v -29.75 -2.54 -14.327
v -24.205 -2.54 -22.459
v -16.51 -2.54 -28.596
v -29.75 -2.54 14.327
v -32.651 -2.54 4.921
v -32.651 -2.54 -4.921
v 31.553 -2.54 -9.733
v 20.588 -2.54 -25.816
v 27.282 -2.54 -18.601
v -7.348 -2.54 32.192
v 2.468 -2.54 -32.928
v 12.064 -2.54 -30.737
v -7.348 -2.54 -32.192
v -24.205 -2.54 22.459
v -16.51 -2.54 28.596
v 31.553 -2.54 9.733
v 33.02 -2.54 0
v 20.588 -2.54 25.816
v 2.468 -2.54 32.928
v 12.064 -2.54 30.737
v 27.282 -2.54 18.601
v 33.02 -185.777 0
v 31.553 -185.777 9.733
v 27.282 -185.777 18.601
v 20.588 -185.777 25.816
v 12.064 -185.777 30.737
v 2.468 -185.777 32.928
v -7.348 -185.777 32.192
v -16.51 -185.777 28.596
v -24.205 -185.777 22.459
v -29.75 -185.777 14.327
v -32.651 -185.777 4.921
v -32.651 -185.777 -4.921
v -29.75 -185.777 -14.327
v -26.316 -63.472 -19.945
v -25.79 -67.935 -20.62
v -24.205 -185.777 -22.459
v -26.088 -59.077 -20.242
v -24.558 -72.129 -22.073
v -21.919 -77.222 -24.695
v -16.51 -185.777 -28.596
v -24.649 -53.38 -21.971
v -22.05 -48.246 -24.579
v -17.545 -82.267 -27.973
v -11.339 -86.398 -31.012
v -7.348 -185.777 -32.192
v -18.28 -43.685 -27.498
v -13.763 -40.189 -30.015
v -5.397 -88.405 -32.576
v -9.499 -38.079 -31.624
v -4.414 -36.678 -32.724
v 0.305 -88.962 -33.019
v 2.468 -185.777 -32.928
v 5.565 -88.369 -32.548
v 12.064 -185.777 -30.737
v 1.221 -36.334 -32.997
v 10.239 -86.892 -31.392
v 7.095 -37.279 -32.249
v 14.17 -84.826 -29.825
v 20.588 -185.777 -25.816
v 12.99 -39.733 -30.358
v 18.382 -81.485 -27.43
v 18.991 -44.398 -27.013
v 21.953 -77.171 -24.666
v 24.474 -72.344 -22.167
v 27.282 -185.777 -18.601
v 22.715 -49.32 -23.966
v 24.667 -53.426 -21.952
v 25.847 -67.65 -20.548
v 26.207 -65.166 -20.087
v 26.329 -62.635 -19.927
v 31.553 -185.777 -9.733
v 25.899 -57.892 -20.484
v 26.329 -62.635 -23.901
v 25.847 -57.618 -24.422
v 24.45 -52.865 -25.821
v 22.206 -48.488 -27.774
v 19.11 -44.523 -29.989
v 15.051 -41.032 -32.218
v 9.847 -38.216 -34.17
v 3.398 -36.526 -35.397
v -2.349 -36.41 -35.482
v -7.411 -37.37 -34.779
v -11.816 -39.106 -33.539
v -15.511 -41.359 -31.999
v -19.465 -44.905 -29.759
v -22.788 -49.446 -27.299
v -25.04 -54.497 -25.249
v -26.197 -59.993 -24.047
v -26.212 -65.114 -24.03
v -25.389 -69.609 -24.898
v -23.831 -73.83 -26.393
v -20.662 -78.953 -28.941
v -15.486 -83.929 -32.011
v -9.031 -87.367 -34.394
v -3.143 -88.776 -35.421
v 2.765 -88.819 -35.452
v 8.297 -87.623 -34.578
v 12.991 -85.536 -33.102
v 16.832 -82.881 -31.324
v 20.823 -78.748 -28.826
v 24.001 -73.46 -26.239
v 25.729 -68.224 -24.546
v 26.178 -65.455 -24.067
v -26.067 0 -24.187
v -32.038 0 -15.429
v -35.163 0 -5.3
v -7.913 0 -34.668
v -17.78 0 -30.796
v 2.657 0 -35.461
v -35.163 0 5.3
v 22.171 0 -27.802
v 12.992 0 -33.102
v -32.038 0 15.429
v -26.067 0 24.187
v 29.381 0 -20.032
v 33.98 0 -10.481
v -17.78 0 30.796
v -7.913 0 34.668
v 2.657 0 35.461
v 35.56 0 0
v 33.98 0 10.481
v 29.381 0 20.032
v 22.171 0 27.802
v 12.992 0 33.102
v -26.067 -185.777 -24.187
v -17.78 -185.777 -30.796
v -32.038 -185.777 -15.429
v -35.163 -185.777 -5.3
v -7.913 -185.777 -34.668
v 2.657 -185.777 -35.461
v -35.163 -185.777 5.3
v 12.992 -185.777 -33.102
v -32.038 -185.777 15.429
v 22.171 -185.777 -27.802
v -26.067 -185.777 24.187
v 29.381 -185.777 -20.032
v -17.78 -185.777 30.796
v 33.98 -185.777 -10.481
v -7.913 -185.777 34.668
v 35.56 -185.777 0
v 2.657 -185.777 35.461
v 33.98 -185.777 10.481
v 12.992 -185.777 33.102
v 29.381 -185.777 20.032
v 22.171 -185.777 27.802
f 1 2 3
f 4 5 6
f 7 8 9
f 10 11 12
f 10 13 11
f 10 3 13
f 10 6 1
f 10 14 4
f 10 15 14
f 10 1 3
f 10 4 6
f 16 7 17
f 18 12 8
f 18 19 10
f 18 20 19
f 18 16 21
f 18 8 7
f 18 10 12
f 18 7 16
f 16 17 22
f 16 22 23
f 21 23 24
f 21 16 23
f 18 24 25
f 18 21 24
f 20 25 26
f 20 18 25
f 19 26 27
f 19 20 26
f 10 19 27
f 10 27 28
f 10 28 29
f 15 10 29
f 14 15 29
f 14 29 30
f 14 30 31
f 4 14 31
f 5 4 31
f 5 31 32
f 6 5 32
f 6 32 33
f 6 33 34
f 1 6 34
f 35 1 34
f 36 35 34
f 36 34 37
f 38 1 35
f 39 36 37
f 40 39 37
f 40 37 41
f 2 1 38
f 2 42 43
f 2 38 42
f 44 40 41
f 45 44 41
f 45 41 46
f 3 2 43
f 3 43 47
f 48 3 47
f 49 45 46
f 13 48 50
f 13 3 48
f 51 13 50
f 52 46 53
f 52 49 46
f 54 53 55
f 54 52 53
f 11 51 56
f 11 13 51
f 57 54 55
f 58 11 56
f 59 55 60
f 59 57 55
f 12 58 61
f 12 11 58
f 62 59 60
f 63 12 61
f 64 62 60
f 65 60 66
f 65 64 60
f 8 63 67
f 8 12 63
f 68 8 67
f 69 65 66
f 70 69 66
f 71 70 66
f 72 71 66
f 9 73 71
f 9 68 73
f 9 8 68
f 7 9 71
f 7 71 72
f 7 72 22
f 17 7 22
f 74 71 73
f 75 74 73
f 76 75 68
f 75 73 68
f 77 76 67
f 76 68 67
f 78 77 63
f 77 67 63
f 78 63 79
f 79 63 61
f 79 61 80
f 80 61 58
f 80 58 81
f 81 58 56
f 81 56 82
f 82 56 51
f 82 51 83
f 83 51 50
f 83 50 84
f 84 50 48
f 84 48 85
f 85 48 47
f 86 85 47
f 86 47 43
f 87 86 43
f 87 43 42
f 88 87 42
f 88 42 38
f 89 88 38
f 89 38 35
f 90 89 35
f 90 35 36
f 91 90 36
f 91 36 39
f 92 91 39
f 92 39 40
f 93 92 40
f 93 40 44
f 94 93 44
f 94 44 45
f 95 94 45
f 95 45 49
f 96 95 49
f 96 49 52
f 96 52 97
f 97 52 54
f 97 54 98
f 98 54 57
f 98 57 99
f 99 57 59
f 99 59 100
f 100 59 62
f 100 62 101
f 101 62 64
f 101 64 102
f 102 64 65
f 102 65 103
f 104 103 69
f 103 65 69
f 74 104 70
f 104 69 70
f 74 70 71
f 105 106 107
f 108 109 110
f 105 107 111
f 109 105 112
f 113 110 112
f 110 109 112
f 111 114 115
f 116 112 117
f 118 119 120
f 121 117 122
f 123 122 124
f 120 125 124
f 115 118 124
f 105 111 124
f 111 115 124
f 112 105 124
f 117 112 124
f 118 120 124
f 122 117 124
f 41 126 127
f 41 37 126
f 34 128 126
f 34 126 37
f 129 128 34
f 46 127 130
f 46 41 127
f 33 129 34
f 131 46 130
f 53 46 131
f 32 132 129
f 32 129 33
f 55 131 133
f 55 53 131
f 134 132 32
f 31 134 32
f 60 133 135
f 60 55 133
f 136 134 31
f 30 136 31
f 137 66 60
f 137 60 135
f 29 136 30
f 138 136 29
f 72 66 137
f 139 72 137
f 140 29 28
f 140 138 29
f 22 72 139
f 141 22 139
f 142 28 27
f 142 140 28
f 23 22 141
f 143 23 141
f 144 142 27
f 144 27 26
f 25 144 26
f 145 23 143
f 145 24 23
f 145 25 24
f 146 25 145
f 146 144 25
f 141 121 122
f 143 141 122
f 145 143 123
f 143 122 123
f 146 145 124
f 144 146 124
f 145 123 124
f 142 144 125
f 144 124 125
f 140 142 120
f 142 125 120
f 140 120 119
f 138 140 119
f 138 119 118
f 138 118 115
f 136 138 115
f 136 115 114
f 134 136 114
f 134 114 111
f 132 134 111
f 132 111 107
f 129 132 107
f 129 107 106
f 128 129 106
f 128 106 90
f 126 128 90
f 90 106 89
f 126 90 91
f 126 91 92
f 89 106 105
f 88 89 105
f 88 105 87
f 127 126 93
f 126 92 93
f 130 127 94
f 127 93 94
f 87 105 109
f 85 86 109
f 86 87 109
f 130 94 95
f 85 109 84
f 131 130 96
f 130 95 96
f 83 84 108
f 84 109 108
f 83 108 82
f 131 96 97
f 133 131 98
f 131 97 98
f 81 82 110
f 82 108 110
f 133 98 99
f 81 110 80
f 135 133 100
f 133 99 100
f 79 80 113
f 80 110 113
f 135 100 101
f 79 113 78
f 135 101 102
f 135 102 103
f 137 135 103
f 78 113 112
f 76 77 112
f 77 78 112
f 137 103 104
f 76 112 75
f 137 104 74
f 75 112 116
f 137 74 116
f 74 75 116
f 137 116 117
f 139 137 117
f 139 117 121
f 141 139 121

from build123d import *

# Parameters (mm, degrees)
F0_R     = 35.56
F1_DEPTH = 185.777068
F2_T     = -2.54
F3_R     = 26.32941
F4_DEPTH = 101.879455


with BuildPart() as f1:
    # F0 (on Front) → F1 (new body)
    with BuildSketch(Plane.XZ):
        Circle(F0_R)
    extrude(amount=F1_DEPTH)

    # F2
    f2_openings = [f1.faces().sort_by_distance(p)[0] for p in [
        (0, -185.777068, 0),
    ]]
    offset(amount=F2_T, openings=f2_openings)

    # F3 (on Top) → F4 (cut)
    with BuildSketch(Plane.XY):
        with Locations((0, -62.634744)):
            Circle(F3_R)
    extrude(amount=-F4_DEPTH, mode=Mode.SUBTRACT)


solid = f1.part
